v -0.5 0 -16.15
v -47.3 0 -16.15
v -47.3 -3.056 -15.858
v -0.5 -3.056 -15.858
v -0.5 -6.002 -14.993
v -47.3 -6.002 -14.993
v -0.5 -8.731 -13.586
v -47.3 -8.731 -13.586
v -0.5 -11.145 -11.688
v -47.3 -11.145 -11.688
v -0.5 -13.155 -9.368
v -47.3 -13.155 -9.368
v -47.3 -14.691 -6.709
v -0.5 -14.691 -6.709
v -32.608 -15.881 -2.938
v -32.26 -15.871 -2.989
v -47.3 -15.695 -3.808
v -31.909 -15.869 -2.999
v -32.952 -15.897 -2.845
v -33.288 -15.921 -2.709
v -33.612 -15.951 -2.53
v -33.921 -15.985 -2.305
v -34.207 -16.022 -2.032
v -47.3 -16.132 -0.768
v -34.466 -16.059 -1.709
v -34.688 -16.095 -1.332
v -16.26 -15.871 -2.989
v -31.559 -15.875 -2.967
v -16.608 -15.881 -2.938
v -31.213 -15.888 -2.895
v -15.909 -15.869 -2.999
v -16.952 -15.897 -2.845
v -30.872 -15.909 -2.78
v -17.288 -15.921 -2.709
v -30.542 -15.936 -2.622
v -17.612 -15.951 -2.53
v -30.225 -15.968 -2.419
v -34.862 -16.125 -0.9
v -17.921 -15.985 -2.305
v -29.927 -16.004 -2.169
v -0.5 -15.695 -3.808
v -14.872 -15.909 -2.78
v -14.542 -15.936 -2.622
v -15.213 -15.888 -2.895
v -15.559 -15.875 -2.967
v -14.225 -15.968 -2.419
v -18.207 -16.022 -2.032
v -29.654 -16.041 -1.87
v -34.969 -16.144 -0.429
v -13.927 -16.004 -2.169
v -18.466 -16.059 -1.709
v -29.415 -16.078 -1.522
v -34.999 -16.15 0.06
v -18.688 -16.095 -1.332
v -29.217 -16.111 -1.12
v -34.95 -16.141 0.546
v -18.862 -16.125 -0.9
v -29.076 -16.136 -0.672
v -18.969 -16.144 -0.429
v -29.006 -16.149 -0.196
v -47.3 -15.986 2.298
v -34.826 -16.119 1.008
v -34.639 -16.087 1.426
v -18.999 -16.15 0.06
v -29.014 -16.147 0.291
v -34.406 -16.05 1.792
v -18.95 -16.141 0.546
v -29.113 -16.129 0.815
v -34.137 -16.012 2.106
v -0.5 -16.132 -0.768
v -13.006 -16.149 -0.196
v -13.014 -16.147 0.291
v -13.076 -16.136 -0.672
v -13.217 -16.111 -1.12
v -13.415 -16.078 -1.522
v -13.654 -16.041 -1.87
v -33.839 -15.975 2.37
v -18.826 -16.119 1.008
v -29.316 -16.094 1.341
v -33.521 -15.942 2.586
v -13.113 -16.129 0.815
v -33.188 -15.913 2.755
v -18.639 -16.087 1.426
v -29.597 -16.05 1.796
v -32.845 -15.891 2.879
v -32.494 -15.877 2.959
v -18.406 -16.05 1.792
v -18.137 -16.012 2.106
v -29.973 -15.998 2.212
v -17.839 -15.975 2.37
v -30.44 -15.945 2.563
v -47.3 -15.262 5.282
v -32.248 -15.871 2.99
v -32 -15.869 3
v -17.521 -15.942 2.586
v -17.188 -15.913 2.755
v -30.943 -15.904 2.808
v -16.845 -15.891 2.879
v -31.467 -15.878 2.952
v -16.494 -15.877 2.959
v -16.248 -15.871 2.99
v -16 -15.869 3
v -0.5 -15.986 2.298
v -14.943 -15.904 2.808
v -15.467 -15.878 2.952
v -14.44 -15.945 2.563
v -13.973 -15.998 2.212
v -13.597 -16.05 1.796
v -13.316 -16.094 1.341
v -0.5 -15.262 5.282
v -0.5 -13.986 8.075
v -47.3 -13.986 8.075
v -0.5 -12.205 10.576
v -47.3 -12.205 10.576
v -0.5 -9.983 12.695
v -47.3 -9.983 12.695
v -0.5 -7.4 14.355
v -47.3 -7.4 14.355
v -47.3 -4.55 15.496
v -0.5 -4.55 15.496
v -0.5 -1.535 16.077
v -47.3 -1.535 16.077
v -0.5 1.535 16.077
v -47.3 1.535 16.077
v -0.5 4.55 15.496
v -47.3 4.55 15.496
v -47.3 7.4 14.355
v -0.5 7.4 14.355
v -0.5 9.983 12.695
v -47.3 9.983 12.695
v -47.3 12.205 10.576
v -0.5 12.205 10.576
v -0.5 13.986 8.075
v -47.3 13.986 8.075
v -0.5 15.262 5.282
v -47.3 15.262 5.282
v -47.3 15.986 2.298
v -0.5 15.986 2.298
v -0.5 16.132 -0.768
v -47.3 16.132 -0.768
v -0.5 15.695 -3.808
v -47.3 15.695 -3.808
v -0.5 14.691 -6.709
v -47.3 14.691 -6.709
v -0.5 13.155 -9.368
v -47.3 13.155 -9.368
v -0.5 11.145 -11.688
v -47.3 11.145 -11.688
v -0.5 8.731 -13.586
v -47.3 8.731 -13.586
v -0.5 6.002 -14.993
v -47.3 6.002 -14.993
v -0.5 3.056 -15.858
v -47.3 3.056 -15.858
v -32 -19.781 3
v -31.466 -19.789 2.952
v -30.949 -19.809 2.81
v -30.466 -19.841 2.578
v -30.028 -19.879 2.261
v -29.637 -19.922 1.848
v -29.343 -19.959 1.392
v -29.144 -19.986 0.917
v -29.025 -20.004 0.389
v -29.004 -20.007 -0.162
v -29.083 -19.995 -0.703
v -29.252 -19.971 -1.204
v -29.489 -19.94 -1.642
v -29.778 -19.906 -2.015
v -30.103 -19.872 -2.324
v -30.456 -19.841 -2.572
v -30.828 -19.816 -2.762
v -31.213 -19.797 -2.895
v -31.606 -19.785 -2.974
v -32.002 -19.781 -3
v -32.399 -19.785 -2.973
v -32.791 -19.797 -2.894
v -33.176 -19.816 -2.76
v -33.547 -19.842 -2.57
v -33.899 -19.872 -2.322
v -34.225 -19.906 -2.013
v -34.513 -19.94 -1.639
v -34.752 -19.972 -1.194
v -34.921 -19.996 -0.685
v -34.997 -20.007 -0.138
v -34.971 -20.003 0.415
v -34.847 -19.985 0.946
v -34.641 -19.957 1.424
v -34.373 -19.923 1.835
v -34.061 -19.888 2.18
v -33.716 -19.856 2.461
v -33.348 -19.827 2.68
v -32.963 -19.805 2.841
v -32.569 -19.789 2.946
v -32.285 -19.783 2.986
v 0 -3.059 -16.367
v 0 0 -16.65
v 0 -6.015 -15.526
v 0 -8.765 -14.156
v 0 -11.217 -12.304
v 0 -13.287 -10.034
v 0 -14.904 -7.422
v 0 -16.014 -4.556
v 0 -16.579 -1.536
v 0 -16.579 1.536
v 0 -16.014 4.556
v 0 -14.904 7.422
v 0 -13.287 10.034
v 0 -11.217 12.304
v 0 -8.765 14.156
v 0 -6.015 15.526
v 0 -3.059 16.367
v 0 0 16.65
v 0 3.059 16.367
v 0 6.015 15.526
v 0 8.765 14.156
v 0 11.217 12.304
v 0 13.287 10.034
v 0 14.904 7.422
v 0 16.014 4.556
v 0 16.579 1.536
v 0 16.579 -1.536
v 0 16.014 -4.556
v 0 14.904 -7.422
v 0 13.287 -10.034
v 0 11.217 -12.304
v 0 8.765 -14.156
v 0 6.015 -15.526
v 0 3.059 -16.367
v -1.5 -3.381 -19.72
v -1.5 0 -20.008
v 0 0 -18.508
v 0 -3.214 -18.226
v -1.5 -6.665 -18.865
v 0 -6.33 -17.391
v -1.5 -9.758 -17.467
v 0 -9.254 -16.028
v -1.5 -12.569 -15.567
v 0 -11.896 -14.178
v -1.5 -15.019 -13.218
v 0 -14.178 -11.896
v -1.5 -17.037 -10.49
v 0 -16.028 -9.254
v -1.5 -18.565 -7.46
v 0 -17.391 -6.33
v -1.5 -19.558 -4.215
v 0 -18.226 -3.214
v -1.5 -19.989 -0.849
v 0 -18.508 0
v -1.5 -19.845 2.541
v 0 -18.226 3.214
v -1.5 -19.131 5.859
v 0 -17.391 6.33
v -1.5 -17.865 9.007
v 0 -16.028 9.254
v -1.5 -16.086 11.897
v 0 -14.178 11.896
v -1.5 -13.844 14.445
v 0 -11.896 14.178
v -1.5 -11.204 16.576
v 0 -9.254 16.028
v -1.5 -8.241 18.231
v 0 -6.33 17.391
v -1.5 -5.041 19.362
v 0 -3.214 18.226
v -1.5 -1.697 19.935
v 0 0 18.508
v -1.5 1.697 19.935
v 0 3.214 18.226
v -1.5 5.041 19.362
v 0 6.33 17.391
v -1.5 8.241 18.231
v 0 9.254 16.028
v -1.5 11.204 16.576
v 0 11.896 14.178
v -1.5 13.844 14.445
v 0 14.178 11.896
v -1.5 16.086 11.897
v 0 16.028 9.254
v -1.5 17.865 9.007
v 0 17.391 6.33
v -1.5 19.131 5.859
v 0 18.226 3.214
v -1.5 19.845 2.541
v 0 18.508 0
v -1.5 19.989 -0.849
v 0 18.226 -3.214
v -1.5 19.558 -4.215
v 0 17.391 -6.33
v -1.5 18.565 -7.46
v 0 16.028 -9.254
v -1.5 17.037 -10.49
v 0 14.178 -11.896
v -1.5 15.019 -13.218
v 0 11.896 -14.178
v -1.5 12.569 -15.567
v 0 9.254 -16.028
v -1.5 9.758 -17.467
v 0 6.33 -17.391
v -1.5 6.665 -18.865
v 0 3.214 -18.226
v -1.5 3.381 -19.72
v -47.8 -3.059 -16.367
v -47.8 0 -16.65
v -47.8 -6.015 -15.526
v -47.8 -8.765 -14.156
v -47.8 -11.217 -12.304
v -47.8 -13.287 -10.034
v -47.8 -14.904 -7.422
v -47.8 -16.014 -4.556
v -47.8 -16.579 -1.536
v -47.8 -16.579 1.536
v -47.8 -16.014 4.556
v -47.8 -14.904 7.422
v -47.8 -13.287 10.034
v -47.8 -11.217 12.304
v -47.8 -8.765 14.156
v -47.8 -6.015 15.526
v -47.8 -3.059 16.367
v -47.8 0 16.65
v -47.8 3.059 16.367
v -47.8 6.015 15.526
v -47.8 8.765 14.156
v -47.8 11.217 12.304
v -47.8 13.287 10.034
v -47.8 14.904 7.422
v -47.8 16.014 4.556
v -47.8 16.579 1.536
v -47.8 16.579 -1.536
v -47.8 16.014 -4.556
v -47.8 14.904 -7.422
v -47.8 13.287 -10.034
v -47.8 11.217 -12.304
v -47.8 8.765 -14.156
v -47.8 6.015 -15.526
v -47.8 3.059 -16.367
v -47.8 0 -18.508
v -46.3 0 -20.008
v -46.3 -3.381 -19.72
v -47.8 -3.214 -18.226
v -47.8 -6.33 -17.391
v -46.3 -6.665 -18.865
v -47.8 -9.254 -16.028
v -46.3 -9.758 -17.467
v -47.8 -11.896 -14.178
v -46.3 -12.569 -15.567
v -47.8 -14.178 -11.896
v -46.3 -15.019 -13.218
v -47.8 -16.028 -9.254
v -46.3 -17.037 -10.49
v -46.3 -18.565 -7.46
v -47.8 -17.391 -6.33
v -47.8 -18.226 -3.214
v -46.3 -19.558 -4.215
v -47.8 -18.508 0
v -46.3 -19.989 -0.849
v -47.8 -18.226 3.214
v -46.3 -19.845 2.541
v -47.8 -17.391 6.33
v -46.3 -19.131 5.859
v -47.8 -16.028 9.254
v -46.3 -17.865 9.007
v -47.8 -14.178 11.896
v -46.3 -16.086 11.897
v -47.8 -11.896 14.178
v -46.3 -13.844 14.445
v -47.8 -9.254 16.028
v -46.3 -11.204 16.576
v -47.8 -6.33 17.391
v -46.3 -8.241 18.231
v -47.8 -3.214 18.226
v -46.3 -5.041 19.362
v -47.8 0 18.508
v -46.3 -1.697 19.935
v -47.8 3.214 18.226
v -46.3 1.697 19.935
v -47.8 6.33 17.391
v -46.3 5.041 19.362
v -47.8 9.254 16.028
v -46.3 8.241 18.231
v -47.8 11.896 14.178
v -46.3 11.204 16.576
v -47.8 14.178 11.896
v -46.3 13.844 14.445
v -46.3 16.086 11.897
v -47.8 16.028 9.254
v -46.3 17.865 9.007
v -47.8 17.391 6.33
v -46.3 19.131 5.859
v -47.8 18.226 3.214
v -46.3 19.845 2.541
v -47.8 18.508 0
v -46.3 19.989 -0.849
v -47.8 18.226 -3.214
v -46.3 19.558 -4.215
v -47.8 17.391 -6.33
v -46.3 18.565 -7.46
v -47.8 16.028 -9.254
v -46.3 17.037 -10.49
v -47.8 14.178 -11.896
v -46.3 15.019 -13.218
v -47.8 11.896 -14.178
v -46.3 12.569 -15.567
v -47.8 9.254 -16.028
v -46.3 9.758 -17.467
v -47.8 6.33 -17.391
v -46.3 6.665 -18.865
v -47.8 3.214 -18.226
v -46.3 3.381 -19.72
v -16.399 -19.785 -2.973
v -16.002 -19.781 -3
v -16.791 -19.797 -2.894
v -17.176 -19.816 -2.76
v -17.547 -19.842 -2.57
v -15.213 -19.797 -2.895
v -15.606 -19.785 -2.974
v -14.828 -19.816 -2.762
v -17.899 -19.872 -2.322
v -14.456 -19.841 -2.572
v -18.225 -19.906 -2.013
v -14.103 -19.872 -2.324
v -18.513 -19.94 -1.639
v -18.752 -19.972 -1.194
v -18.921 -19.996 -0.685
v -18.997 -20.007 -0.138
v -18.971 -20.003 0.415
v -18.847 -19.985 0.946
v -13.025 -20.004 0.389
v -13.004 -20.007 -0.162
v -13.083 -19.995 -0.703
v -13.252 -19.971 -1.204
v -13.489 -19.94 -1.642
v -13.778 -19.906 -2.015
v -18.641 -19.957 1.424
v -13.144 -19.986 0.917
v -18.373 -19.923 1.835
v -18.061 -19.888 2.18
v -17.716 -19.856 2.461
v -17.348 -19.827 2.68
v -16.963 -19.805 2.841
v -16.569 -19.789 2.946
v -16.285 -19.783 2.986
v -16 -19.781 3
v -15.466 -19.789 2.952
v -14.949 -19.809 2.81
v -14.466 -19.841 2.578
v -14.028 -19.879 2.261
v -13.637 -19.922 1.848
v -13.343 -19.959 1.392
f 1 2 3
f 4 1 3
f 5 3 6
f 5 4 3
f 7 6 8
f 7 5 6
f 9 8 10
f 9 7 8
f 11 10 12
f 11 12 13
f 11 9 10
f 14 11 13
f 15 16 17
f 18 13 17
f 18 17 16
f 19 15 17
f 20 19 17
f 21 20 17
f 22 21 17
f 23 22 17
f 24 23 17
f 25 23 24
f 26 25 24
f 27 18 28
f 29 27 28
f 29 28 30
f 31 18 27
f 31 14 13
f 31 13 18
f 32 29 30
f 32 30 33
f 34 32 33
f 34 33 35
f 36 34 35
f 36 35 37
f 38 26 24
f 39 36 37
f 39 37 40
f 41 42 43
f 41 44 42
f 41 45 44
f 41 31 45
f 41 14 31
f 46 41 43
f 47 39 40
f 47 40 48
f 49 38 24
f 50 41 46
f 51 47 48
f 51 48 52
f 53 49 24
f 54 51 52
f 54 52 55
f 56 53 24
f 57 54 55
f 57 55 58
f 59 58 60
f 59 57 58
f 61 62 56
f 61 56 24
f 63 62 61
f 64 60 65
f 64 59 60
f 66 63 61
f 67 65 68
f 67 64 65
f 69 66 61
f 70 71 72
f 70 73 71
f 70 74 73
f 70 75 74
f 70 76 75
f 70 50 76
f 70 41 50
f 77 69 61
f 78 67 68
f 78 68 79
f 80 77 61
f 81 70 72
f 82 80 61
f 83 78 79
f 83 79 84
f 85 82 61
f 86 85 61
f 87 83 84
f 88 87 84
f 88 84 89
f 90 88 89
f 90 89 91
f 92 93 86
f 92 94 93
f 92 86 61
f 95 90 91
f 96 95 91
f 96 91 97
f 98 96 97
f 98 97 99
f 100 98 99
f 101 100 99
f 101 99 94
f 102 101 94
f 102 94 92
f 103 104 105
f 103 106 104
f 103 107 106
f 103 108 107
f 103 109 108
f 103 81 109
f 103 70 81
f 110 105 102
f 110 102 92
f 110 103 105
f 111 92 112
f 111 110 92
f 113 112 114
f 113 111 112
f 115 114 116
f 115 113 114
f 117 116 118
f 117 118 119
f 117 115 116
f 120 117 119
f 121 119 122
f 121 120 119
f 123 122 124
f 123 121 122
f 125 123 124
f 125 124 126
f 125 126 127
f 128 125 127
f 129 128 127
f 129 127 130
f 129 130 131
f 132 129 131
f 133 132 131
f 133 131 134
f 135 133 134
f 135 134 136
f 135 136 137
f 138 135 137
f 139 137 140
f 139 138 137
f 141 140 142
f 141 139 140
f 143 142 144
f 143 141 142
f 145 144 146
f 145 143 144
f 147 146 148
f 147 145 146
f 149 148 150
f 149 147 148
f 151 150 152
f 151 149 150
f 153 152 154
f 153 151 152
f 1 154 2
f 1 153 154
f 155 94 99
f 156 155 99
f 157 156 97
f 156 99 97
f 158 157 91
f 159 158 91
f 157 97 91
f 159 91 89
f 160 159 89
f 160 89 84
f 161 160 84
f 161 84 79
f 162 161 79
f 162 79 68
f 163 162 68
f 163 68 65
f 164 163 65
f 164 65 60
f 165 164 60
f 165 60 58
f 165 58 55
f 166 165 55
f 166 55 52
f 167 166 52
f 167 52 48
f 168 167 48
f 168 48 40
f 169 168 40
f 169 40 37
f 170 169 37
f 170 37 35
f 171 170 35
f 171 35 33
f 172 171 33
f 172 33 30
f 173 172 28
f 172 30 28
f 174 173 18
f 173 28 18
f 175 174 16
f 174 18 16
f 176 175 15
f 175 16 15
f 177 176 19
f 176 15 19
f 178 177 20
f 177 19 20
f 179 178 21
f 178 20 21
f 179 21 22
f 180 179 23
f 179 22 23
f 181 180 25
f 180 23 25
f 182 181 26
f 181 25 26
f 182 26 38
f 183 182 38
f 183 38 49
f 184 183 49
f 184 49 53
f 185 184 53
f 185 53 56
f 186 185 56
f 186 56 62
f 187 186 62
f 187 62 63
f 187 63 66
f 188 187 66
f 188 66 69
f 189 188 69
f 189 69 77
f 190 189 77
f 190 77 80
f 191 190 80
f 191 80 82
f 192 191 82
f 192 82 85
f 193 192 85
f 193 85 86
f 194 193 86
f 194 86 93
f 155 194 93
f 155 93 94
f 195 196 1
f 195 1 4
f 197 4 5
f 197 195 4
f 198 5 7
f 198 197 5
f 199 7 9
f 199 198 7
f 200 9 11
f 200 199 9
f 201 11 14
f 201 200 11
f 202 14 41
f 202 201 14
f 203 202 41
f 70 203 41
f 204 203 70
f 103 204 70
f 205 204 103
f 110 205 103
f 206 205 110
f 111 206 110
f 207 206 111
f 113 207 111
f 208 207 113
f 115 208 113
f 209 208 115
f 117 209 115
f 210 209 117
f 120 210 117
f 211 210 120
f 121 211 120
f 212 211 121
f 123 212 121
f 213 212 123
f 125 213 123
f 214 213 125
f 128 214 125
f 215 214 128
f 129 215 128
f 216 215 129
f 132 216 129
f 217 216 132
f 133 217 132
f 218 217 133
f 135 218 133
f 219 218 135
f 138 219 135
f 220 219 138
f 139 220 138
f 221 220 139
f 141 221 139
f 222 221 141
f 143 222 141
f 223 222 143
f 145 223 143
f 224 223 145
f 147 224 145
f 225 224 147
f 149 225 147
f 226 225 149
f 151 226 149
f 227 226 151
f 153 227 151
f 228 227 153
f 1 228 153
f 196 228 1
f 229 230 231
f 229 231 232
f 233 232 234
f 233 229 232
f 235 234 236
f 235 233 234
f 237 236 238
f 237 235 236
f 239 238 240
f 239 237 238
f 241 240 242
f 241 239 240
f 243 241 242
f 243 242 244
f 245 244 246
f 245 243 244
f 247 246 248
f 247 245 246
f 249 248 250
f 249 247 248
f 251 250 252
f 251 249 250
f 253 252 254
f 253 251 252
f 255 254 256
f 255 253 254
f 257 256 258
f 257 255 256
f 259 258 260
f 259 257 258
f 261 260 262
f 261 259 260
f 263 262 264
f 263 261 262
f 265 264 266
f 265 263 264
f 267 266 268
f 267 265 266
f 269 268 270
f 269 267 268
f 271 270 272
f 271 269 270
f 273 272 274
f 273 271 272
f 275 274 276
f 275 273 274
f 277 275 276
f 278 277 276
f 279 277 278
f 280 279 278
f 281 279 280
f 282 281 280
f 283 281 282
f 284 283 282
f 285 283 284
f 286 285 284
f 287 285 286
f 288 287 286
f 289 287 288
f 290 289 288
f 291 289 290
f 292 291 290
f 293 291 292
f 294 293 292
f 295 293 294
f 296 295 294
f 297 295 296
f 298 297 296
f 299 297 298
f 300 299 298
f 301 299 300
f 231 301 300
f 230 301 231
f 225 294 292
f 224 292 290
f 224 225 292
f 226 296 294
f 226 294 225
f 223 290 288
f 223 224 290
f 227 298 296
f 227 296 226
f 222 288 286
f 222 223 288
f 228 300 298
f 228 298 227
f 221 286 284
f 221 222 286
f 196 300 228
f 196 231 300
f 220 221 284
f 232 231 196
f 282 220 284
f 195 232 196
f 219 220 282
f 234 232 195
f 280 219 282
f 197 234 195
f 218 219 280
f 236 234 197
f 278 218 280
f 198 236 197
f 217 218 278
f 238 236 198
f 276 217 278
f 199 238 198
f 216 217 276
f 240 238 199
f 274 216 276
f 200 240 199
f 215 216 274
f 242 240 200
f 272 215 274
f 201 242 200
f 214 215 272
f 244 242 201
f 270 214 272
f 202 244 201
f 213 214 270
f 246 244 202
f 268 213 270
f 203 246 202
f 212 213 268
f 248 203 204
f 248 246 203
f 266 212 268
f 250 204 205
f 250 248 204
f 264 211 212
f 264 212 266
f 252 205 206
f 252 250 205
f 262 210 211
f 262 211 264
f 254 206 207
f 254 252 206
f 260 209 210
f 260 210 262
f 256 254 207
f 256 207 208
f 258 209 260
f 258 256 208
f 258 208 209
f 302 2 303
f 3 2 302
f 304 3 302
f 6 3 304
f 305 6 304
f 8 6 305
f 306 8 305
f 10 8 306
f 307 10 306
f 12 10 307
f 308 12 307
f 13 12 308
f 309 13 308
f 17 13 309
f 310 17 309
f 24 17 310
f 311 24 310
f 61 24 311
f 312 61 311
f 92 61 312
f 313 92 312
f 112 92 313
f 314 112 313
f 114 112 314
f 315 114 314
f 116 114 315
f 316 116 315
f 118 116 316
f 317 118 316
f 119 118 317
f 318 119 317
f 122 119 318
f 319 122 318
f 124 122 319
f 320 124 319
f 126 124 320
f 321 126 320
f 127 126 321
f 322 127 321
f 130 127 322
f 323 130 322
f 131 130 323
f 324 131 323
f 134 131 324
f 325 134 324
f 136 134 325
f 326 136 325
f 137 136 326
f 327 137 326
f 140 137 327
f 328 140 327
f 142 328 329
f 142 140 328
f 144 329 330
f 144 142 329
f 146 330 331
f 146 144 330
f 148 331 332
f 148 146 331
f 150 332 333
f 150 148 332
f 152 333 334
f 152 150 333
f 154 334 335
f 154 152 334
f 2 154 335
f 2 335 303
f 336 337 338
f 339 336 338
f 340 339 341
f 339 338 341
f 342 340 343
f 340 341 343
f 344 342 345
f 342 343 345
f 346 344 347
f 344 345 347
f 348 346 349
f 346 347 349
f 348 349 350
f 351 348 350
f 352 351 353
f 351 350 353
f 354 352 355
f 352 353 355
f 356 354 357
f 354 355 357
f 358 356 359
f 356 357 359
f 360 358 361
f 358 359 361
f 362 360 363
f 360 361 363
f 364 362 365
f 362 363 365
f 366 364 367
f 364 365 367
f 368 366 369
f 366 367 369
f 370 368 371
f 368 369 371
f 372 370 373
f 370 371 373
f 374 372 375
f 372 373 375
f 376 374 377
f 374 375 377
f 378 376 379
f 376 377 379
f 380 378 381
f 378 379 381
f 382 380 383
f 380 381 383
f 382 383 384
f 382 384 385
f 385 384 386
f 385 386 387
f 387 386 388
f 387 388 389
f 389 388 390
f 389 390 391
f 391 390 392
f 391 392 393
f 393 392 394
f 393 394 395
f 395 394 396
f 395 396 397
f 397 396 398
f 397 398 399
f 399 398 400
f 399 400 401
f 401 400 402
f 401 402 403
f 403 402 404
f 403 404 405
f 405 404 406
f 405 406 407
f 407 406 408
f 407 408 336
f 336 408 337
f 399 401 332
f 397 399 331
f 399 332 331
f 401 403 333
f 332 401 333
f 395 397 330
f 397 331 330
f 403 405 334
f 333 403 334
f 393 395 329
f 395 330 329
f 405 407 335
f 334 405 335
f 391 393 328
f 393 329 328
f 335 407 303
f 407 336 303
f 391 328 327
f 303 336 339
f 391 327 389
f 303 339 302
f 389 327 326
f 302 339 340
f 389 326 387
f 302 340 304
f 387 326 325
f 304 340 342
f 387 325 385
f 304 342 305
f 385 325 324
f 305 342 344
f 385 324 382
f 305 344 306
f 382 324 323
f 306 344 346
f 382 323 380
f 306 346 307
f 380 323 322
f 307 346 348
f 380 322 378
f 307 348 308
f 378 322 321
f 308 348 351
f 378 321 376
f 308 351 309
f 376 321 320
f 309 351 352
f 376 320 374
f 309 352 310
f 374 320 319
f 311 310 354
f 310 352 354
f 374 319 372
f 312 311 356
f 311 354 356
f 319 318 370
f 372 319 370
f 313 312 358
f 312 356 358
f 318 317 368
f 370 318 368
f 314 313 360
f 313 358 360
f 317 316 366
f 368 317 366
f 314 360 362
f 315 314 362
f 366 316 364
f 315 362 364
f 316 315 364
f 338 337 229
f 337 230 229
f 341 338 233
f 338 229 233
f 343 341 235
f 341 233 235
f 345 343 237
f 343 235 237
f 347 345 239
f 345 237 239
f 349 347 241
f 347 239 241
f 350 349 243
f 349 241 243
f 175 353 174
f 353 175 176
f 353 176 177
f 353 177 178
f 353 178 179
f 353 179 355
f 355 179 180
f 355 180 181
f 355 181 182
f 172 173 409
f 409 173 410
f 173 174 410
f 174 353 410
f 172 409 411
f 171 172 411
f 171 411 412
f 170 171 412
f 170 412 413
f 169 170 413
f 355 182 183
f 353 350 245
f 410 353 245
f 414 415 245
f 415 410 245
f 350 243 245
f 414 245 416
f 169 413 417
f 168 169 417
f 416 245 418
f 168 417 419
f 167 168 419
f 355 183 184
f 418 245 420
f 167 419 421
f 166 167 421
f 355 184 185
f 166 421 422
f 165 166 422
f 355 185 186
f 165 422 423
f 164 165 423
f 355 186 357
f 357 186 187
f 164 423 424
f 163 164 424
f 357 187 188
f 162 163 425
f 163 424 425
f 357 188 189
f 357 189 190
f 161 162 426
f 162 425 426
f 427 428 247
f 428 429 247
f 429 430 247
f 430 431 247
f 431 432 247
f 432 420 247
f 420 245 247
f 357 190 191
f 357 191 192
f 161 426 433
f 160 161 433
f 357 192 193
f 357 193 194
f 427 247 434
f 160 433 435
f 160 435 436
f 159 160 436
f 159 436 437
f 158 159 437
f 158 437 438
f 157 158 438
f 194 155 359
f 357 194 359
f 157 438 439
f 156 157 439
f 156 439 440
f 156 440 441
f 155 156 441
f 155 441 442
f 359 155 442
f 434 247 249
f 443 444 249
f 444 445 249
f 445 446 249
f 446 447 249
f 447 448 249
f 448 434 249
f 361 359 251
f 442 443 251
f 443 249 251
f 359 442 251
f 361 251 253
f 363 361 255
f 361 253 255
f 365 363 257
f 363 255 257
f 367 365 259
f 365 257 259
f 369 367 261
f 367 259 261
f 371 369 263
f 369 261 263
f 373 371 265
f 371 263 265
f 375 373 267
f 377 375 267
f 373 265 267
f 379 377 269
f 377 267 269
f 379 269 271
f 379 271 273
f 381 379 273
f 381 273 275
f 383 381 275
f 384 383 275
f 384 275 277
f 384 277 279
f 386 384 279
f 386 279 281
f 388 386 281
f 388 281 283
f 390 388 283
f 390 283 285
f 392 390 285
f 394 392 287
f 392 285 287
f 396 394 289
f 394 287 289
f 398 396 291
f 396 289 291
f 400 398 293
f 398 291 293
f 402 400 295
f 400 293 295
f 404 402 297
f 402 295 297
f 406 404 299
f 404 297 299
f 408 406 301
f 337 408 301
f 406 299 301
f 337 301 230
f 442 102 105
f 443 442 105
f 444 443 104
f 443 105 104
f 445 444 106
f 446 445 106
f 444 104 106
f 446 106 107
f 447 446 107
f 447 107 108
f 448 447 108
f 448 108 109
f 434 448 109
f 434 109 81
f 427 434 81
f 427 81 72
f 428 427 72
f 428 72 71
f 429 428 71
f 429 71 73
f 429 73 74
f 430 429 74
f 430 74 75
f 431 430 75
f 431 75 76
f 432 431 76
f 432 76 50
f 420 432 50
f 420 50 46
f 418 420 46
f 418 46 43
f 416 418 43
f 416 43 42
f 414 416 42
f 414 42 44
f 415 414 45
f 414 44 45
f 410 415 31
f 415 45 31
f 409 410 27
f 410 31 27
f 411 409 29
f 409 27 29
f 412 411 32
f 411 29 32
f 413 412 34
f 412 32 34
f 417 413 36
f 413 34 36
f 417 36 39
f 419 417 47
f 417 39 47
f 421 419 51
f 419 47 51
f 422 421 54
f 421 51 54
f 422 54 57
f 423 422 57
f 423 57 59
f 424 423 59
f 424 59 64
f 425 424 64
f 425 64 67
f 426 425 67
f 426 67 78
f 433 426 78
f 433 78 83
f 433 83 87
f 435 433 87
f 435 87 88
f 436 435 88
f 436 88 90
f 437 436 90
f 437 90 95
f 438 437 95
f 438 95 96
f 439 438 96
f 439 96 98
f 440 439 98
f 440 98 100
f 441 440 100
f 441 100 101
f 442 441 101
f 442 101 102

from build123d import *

# Parameters (mm, degrees)
SKETCH2_W          = 47.8
SKETCH2_H          = 3.8575
CHAMFER1_SIZE      = 1.5
CHAMFER2_SIZE      = 0.5
SKETCH3_R          = 3
CUT_EXTRUDE1_DEPTH = 56.546738091


with BuildPart() as part:
    # Sketch2 → Revolve1 (revolve)
    with BuildSketch(Plane.XY, mode=Mode.PRIVATE) as revolve1_sk:
        with Locations((-23.9, 18.07875)):
            Rectangle(SKETCH2_W, SKETCH2_H)
    revolve(revolve1_sk.sketch.rotate(Axis((0, 0, 0), (-1, 0, 0)), 90), axis=Axis((0, 0, 0), (-1, 0, 0)))

    # Chamfer1
    chamfer1_edges = [part.edges().sort_by_distance(p)[0] for p in [
        (-47.8, 0, 20.0075),
        (0, 0, 20.0075),
    ]]
    chamfer(chamfer1_edges, length=CHAMFER1_SIZE)

    # Chamfer2
    chamfer2_edges = [part.edges().sort_by_distance(p)[0] for p in [
        (-47.8, 0, 16.15),
        (0, 0, 16.15),
    ]]
    chamfer(chamfer2_edges, length=CHAMFER2_SIZE)

    # Sketch3 → Cut-Extrude1 (cut, through all)
    with BuildSketch(Plane(origin=(0, 0, 0), x_dir=(1, 0, 0), z_dir=(0, 1, 0))):
        with Locations(Location((-16, 0, 0), (0, 0, 270))):
            Circle(SKETCH3_R)
        with Locations(Location((-32, 0, 0), (0, 0, 270))):
            Circle(SKETCH3_R)
    extrude(amount=-CUT_EXTRUDE1_DEPTH, mode=Mode.SUBTRACT)


solid = part.part
